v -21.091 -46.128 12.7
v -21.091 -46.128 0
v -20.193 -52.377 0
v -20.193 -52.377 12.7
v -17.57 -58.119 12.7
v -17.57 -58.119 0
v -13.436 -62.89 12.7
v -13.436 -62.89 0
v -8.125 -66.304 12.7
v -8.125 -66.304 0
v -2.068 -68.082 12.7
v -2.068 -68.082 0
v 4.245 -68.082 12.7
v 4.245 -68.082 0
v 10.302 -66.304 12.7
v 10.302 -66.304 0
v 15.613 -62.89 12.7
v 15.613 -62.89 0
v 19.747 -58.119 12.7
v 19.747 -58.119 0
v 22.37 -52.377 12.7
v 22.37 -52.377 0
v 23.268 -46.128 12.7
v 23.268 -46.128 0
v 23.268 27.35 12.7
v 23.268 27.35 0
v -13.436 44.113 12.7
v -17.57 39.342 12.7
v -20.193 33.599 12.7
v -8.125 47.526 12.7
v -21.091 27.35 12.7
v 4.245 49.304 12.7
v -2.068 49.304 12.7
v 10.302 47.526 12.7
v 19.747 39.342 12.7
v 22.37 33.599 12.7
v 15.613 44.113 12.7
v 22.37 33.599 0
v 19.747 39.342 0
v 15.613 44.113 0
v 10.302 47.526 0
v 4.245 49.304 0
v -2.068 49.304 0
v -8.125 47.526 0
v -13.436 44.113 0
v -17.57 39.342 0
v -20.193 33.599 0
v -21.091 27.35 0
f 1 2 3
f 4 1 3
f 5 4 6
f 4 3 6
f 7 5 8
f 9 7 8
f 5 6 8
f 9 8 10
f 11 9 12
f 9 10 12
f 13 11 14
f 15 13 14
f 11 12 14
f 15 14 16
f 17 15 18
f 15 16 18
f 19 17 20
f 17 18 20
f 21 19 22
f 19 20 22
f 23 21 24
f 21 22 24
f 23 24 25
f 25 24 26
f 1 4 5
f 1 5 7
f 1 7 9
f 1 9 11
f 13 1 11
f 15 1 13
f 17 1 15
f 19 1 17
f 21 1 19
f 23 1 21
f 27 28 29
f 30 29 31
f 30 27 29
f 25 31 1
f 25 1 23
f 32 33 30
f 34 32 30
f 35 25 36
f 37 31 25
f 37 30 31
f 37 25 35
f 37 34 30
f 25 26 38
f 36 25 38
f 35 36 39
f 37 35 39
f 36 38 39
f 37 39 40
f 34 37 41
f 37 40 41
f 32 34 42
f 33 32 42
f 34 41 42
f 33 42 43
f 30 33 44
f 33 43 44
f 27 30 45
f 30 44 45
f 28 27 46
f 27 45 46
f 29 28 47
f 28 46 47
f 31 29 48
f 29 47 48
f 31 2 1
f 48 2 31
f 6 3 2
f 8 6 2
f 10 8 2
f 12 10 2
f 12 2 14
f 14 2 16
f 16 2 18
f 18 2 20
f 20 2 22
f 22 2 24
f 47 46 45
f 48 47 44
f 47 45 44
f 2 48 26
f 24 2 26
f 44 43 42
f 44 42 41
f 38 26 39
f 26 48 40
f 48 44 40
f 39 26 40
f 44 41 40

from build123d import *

# Parameters (mm, degrees)
F0_W     = 44.359287
F0_H     = 73.47857
F1_DEPTH = 12.7


with BuildPart() as f1:
    # F0 (on Top) → F1 (new body)
    with BuildSketch(Plane.XY):
        with BuildLine():
            ThreePointArc((23.268217, 27.350357), (1.088574, 49.53), (-21.09107, 27.350357))
            Line((-21.09107, 27.350357), (23.268217, 27.350357))
        make_face()
        with Locations((1.088574, -9.388928)):
            Rectangle(F0_W, F0_H)
        with BuildLine():
            Line((23.268217, -46.128213), (-21.09107, -46.128213))
            ThreePointArc((-21.09107, -46.128213), (1.088574, -68.307857), (23.268217, -46.128213))
        make_face()
    extrude(amount=F1_DEPTH)


solid = f1.part
